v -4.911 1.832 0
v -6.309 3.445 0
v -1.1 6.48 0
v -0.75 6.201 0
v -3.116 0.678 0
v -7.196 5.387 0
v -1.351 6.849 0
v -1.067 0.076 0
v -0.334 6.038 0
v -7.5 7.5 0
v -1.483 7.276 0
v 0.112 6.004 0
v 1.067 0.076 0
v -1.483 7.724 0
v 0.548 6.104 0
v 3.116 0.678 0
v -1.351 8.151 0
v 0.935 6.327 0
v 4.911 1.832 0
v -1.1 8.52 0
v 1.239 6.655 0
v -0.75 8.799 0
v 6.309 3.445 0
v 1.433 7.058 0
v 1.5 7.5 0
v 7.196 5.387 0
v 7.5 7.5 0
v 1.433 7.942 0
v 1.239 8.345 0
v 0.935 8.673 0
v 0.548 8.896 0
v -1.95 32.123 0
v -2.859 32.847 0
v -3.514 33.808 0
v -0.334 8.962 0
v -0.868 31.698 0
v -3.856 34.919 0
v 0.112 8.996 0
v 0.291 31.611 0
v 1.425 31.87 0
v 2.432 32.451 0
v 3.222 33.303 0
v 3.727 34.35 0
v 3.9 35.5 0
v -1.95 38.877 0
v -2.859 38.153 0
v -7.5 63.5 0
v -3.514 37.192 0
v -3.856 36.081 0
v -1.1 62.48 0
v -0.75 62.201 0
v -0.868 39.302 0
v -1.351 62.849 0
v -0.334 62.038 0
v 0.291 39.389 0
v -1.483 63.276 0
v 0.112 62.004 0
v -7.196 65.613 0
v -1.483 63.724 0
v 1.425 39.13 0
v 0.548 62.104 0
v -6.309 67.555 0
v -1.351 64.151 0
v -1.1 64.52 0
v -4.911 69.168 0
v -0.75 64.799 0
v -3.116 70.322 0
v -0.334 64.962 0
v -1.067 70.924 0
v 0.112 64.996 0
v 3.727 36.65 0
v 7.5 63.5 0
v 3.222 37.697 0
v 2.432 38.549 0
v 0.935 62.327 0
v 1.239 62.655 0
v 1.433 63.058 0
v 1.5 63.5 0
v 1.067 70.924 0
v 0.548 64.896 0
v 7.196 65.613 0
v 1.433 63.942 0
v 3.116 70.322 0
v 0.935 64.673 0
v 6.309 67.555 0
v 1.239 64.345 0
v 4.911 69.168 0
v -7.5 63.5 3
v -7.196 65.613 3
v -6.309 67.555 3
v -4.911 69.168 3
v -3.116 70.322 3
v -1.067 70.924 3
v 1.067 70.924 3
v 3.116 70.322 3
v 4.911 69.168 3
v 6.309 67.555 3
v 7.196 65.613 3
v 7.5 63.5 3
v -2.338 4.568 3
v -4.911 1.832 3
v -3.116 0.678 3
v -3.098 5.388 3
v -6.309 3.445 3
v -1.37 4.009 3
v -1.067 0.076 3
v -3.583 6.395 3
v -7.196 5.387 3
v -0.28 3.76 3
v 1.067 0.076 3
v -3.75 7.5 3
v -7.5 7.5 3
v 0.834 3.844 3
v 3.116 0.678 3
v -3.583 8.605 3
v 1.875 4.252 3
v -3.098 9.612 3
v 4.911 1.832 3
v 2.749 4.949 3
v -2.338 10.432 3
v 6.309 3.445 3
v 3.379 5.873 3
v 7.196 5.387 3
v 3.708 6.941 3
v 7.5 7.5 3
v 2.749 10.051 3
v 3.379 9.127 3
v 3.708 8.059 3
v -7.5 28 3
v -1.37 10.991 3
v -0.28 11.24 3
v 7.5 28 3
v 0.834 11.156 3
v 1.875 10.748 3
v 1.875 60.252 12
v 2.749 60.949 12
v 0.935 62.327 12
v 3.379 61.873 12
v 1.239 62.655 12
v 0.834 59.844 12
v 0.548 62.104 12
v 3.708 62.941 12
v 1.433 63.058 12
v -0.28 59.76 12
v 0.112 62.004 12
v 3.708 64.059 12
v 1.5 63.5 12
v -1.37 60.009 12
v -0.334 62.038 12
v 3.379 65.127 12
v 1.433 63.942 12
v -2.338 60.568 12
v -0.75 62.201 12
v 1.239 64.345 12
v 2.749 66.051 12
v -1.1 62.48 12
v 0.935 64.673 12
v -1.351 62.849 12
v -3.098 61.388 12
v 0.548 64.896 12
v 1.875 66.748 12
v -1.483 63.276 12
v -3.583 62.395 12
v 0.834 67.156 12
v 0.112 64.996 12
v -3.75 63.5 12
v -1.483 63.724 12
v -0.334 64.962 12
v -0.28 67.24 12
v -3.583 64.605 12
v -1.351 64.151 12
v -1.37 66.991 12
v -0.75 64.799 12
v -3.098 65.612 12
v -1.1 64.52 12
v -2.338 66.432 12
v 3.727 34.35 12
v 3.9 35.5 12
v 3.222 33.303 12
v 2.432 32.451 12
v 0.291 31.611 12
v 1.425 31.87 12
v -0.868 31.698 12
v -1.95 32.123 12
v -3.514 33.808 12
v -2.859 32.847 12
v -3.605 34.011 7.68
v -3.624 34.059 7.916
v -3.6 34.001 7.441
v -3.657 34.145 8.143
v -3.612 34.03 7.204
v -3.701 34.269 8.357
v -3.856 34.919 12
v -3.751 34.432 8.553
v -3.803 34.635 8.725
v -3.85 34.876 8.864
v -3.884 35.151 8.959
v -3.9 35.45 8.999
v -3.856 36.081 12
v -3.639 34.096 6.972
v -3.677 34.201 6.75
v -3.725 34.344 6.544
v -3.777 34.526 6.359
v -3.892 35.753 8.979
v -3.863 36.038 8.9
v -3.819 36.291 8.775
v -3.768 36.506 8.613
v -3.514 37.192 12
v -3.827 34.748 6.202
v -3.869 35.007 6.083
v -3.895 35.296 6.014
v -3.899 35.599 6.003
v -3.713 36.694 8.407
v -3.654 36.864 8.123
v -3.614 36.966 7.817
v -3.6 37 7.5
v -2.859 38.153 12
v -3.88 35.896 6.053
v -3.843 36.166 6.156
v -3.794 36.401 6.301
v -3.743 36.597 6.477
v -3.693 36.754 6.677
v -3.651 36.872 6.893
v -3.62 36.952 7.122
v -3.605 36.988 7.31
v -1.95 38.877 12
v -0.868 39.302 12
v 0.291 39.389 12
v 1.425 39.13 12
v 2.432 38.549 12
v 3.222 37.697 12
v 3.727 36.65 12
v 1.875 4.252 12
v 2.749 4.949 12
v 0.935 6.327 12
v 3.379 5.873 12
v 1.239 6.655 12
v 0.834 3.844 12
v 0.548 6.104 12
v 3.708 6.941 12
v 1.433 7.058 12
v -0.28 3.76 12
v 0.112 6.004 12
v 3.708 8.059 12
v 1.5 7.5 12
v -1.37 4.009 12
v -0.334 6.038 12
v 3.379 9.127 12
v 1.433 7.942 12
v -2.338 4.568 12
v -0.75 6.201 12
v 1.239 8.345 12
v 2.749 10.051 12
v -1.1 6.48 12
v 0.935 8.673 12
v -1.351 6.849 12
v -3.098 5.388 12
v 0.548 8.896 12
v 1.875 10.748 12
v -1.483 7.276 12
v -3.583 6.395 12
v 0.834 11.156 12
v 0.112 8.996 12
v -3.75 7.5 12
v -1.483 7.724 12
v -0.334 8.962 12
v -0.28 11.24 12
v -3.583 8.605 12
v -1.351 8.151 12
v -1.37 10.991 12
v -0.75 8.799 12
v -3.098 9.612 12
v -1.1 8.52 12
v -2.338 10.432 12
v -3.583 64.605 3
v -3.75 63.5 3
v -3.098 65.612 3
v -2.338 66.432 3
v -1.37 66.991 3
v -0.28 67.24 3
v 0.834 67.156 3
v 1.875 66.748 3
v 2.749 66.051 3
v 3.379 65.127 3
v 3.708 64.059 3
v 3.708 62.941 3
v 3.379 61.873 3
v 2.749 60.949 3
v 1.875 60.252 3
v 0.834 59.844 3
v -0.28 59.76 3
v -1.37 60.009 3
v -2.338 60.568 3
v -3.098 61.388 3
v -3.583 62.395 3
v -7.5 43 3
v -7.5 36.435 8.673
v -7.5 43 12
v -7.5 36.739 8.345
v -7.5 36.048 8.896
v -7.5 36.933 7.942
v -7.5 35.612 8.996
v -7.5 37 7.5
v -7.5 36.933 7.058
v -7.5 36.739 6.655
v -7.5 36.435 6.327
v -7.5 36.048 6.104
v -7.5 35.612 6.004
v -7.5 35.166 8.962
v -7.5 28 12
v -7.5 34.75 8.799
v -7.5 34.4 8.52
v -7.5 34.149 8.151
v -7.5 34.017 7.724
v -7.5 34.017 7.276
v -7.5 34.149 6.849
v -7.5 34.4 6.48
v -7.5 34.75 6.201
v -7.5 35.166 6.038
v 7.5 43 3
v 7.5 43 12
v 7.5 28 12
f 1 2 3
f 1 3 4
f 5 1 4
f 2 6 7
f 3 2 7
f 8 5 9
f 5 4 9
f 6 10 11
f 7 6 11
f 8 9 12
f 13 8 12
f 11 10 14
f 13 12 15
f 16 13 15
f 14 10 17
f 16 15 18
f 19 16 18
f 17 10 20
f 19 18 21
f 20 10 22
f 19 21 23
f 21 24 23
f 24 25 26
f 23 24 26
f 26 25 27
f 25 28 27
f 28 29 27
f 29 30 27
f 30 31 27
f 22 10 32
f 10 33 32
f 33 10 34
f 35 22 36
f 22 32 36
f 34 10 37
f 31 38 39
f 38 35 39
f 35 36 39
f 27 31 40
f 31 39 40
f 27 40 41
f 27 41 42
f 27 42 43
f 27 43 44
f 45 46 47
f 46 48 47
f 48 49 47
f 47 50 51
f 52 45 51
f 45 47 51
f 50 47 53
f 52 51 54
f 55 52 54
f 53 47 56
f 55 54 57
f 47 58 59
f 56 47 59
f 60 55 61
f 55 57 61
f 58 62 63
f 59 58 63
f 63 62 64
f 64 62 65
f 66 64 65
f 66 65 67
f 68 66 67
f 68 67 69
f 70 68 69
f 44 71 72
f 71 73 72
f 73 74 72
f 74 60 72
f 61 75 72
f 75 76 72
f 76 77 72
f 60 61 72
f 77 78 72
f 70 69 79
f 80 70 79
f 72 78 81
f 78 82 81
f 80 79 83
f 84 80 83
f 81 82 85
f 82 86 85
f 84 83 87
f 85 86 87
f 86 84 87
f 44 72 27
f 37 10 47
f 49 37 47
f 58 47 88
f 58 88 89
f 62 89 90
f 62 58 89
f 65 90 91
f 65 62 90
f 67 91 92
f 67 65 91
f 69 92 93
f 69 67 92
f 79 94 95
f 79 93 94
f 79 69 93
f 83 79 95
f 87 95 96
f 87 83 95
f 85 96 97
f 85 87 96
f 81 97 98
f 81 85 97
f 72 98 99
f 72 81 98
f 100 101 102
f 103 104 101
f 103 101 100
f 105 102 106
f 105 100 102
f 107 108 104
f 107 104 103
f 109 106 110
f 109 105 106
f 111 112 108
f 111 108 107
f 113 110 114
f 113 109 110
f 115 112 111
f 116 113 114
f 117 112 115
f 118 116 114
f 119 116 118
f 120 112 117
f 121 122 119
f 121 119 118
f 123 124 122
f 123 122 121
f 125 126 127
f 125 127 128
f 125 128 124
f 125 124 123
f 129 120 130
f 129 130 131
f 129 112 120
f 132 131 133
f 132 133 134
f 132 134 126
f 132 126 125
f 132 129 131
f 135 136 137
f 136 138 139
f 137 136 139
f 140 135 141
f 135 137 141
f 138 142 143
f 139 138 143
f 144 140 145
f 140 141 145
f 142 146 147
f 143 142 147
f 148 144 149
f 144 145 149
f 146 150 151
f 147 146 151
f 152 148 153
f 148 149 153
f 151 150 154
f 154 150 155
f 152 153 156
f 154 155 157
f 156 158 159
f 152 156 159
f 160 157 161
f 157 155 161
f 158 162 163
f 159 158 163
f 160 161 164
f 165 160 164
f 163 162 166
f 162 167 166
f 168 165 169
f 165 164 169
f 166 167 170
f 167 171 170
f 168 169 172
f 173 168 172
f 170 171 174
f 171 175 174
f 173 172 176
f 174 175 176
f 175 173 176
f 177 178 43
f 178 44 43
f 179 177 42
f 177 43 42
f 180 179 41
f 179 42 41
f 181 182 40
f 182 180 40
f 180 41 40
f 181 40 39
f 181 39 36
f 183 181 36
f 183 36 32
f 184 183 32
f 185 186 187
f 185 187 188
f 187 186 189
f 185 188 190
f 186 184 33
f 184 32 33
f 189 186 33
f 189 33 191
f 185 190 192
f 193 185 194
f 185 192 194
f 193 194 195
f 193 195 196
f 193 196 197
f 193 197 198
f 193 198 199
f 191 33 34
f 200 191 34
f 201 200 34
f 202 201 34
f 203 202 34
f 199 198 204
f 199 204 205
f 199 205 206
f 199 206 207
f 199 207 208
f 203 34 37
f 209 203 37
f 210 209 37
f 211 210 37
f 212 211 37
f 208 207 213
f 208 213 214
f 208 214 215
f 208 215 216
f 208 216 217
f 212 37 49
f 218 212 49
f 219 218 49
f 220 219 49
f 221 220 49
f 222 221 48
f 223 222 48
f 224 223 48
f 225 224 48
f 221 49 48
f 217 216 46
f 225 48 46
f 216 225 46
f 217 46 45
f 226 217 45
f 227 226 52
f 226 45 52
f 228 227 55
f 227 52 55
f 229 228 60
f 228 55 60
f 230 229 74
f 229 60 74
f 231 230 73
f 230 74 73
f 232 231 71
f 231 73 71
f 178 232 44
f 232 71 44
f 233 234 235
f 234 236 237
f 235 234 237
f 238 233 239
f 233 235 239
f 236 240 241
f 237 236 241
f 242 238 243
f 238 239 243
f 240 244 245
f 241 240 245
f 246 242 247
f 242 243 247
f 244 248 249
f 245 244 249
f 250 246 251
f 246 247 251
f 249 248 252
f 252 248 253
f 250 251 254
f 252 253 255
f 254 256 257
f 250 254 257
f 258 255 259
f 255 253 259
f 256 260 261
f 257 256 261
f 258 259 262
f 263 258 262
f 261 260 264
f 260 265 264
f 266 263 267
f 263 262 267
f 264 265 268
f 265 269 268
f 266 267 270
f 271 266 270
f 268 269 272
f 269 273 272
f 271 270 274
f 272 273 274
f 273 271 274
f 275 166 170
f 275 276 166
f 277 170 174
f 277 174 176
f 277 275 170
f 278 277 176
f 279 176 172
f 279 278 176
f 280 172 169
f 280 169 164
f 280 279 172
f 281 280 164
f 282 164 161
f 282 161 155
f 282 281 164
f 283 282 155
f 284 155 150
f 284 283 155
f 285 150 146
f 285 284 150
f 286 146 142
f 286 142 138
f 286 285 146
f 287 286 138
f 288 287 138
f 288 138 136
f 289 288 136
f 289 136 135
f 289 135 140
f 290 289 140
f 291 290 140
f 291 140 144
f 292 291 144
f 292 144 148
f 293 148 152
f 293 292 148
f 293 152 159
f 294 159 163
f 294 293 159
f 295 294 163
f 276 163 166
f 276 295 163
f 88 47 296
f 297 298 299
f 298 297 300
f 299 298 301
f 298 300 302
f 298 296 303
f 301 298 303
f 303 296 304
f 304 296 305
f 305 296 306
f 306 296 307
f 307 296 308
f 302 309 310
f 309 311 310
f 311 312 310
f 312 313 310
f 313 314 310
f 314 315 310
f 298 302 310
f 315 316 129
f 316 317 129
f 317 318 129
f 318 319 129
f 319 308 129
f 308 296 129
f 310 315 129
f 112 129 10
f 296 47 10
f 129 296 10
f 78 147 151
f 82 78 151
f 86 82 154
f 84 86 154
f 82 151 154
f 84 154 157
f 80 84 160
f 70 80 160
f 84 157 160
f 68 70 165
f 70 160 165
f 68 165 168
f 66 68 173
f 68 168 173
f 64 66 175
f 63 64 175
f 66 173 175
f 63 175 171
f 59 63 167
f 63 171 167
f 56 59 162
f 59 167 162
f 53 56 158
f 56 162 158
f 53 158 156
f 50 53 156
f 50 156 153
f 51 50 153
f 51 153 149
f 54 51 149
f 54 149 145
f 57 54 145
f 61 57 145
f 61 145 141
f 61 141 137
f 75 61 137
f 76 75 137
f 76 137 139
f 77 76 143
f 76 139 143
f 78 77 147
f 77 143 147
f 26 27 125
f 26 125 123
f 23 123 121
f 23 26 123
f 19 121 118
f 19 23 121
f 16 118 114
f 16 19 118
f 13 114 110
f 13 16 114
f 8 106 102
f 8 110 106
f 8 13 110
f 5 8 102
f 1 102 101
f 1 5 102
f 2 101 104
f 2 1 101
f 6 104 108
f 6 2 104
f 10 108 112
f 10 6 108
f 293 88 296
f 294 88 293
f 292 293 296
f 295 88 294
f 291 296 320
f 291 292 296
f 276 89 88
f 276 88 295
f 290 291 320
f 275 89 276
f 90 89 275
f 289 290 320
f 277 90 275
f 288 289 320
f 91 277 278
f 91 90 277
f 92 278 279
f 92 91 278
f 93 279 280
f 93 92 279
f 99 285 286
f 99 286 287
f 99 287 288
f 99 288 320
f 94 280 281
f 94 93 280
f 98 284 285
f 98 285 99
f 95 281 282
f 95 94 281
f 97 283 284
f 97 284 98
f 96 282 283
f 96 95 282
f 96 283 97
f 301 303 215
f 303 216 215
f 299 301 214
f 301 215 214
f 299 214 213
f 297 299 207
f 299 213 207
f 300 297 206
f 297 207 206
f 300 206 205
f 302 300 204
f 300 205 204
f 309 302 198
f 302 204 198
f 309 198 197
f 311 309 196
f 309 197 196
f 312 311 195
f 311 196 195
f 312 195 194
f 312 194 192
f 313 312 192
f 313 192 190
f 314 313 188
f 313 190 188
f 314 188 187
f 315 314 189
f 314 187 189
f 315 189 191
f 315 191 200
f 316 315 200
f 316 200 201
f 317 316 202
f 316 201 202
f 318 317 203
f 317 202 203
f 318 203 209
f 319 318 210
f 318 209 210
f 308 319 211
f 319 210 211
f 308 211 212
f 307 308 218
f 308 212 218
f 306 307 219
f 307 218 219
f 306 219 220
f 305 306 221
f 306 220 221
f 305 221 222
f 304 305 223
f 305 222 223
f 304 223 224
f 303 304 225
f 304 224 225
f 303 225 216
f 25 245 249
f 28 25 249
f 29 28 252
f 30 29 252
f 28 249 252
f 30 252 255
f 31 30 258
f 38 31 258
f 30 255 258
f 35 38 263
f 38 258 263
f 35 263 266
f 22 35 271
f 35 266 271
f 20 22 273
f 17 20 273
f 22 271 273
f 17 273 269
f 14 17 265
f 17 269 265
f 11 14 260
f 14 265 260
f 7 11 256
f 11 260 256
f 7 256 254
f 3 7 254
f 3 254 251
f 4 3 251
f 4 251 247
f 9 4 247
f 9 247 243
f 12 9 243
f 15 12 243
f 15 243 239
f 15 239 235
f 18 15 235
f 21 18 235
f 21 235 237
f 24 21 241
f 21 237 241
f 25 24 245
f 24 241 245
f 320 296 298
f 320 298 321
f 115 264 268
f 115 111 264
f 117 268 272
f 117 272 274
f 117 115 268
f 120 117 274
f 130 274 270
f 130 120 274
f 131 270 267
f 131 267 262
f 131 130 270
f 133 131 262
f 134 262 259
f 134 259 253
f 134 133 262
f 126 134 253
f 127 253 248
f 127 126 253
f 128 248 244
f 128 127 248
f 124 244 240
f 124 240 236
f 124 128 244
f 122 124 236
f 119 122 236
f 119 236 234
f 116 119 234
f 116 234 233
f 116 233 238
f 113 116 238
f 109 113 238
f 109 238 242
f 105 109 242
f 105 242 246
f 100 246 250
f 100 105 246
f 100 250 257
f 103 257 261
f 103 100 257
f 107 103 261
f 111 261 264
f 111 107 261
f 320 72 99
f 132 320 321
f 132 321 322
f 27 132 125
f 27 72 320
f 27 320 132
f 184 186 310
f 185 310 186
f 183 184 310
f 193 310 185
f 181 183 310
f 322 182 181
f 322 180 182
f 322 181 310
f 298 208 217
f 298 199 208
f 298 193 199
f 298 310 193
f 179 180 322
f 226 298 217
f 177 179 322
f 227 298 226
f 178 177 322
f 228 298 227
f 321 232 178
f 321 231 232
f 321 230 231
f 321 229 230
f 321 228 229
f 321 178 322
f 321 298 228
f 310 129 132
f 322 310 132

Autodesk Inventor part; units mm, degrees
ref_plane "YZ Plane" through (0, 0, 0) normal (1, 0, 0) x (0, 1, 0)
ref_plane "XZ Plane" through (0, 0, 0) normal (0, 1, 0) x (-1, 0, 0)
ref_plane "XY Plane" through (0, 0, 0) normal (0, 0, 1) x (1, 0, 0)
sketch "Sketch1" plane through (0, 0, 0) normal (0, 0, 1) x (1, 0, 0)
  line L0 (0, 0) -> (0, 71) construction
  circle A0 centre (0, 63.5) radius 7.5 construction
  circle A1 centre (0, 7.5) radius 7.5 construction
  line L1 (7.5, 63.5) -> (7.5, 7.5)
  line L2 (-7.5, 7.5) -> (-7.5, 63.5)
  arc A2 (7.5, 63.5) -> (-7.5, 63.5) centre (0, 63.5) ccw
  arc A3 (-7.5, 7.5) -> (7.5, 7.5) centre (0, 7.5) ccw
  circle A4 centre (0, 35.5) radius 3.9
  circle A5 centre (0, 63.5) radius 3.75
  circle A6 centre (0, 7.5) radius 3.75
  dimension "d1" = 15
  dimension "d2" = 15
  dimension "d3" = 7.8
  dimension "d4" = 7.5
  dimension "d5" = 7.5
  dimension "d21" = 56
extrude "Extrusion1" add sketch "Sketch1" along normal blind 3
sketch "Sketch3" plane through (0, 0, 0) normal (0, 0, -1) x (-1, 0, 0)
  circle A0 centre (0, 63.5) radius 3.75 projected
  circle A1 centre (0, 7.5) radius 3.75 projected
  point P0 (0, 0)
extrude "Extrusion2" add sketch "Sketch3" against normal blind 12
sketch "Sketch4" plane through (0, 63.5, 12) normal (0, 0, 1) x (1, 0, 0)
  circle A0 centre (0, 0) radius 3.75 projected
  circle A1 centre (0, -56) radius 3.75 projected
  circle A2 centre (0, 0) radius 1.5
  circle A3 centre (0, -56) radius 1.5
  point P0 (0, -63.5)
  dimension "d10" = 3
  dimension "d11" = 3
extrude "Extrusion3" cut sketch "Sketch4" against normal through all contours A2 | A3
sketch "Sketch5" plane through (0, 0, 3) normal (0, 0, 1) x (1, 0, 0)
  circle A0 centre (0, 63.5) radius 1.5 projected
  line L0 (7.5, 43) -> (7.5, 28)
  line L1 (-7.5, 43) -> (-7.5, 28)
  circle A1 centre (0, 35.5) radius 3.9 projected
  line L2 (-7.5, 43) -> (7.5, 43)
  line L3 (-7.5, 28) -> (7.5, 28)
  point P0 (0, 0)
  point P1 (-7.5, 35.5)
  point P2 (7.5, 35.5)
  point P3 (7.5, 63.5)
  point P4 (-7.5, 63.5)
  point P5 (7.5, 7.5)
  dimension "d22" = 15
extrude "Extrusion4" add sketch "Sketch5" along normal blind 9 contours L0 L3 L1 L2
sketch "Sketch6" plane through (0, 0, 0) normal (1, 0, 0) x (0, 1, 0)
  line L0 (7.5, 0) -> (63.5, 0) projected
  line L1 (7.5, 0) -> (7.5, 3) projected
  line L2 (63.5, 3) -> (43, 3) projected
  line L3 (28, 3) -> (28, 12) projected
  line L4 (43, 12) -> (28, 12) projected
  line L5 (43, 3) -> (43, 12) projected
  line L6 (63.5, 0) -> (63.5, 3) projected
  circle A0 centre (35.5, 7.5) radius 1.5
  line L7 (28, 3) -> (7.5, 3) projected
  point P0 (0, 0)
  point P1 (35.5, 12)
  point P2 (43, 7.5)
  dimension "d18" = 3
extrude "Extrusion5" cut sketch "Sketch6" against normal through all contours A0
properties part number "WaveGenerator" material "ABS Plastic"
